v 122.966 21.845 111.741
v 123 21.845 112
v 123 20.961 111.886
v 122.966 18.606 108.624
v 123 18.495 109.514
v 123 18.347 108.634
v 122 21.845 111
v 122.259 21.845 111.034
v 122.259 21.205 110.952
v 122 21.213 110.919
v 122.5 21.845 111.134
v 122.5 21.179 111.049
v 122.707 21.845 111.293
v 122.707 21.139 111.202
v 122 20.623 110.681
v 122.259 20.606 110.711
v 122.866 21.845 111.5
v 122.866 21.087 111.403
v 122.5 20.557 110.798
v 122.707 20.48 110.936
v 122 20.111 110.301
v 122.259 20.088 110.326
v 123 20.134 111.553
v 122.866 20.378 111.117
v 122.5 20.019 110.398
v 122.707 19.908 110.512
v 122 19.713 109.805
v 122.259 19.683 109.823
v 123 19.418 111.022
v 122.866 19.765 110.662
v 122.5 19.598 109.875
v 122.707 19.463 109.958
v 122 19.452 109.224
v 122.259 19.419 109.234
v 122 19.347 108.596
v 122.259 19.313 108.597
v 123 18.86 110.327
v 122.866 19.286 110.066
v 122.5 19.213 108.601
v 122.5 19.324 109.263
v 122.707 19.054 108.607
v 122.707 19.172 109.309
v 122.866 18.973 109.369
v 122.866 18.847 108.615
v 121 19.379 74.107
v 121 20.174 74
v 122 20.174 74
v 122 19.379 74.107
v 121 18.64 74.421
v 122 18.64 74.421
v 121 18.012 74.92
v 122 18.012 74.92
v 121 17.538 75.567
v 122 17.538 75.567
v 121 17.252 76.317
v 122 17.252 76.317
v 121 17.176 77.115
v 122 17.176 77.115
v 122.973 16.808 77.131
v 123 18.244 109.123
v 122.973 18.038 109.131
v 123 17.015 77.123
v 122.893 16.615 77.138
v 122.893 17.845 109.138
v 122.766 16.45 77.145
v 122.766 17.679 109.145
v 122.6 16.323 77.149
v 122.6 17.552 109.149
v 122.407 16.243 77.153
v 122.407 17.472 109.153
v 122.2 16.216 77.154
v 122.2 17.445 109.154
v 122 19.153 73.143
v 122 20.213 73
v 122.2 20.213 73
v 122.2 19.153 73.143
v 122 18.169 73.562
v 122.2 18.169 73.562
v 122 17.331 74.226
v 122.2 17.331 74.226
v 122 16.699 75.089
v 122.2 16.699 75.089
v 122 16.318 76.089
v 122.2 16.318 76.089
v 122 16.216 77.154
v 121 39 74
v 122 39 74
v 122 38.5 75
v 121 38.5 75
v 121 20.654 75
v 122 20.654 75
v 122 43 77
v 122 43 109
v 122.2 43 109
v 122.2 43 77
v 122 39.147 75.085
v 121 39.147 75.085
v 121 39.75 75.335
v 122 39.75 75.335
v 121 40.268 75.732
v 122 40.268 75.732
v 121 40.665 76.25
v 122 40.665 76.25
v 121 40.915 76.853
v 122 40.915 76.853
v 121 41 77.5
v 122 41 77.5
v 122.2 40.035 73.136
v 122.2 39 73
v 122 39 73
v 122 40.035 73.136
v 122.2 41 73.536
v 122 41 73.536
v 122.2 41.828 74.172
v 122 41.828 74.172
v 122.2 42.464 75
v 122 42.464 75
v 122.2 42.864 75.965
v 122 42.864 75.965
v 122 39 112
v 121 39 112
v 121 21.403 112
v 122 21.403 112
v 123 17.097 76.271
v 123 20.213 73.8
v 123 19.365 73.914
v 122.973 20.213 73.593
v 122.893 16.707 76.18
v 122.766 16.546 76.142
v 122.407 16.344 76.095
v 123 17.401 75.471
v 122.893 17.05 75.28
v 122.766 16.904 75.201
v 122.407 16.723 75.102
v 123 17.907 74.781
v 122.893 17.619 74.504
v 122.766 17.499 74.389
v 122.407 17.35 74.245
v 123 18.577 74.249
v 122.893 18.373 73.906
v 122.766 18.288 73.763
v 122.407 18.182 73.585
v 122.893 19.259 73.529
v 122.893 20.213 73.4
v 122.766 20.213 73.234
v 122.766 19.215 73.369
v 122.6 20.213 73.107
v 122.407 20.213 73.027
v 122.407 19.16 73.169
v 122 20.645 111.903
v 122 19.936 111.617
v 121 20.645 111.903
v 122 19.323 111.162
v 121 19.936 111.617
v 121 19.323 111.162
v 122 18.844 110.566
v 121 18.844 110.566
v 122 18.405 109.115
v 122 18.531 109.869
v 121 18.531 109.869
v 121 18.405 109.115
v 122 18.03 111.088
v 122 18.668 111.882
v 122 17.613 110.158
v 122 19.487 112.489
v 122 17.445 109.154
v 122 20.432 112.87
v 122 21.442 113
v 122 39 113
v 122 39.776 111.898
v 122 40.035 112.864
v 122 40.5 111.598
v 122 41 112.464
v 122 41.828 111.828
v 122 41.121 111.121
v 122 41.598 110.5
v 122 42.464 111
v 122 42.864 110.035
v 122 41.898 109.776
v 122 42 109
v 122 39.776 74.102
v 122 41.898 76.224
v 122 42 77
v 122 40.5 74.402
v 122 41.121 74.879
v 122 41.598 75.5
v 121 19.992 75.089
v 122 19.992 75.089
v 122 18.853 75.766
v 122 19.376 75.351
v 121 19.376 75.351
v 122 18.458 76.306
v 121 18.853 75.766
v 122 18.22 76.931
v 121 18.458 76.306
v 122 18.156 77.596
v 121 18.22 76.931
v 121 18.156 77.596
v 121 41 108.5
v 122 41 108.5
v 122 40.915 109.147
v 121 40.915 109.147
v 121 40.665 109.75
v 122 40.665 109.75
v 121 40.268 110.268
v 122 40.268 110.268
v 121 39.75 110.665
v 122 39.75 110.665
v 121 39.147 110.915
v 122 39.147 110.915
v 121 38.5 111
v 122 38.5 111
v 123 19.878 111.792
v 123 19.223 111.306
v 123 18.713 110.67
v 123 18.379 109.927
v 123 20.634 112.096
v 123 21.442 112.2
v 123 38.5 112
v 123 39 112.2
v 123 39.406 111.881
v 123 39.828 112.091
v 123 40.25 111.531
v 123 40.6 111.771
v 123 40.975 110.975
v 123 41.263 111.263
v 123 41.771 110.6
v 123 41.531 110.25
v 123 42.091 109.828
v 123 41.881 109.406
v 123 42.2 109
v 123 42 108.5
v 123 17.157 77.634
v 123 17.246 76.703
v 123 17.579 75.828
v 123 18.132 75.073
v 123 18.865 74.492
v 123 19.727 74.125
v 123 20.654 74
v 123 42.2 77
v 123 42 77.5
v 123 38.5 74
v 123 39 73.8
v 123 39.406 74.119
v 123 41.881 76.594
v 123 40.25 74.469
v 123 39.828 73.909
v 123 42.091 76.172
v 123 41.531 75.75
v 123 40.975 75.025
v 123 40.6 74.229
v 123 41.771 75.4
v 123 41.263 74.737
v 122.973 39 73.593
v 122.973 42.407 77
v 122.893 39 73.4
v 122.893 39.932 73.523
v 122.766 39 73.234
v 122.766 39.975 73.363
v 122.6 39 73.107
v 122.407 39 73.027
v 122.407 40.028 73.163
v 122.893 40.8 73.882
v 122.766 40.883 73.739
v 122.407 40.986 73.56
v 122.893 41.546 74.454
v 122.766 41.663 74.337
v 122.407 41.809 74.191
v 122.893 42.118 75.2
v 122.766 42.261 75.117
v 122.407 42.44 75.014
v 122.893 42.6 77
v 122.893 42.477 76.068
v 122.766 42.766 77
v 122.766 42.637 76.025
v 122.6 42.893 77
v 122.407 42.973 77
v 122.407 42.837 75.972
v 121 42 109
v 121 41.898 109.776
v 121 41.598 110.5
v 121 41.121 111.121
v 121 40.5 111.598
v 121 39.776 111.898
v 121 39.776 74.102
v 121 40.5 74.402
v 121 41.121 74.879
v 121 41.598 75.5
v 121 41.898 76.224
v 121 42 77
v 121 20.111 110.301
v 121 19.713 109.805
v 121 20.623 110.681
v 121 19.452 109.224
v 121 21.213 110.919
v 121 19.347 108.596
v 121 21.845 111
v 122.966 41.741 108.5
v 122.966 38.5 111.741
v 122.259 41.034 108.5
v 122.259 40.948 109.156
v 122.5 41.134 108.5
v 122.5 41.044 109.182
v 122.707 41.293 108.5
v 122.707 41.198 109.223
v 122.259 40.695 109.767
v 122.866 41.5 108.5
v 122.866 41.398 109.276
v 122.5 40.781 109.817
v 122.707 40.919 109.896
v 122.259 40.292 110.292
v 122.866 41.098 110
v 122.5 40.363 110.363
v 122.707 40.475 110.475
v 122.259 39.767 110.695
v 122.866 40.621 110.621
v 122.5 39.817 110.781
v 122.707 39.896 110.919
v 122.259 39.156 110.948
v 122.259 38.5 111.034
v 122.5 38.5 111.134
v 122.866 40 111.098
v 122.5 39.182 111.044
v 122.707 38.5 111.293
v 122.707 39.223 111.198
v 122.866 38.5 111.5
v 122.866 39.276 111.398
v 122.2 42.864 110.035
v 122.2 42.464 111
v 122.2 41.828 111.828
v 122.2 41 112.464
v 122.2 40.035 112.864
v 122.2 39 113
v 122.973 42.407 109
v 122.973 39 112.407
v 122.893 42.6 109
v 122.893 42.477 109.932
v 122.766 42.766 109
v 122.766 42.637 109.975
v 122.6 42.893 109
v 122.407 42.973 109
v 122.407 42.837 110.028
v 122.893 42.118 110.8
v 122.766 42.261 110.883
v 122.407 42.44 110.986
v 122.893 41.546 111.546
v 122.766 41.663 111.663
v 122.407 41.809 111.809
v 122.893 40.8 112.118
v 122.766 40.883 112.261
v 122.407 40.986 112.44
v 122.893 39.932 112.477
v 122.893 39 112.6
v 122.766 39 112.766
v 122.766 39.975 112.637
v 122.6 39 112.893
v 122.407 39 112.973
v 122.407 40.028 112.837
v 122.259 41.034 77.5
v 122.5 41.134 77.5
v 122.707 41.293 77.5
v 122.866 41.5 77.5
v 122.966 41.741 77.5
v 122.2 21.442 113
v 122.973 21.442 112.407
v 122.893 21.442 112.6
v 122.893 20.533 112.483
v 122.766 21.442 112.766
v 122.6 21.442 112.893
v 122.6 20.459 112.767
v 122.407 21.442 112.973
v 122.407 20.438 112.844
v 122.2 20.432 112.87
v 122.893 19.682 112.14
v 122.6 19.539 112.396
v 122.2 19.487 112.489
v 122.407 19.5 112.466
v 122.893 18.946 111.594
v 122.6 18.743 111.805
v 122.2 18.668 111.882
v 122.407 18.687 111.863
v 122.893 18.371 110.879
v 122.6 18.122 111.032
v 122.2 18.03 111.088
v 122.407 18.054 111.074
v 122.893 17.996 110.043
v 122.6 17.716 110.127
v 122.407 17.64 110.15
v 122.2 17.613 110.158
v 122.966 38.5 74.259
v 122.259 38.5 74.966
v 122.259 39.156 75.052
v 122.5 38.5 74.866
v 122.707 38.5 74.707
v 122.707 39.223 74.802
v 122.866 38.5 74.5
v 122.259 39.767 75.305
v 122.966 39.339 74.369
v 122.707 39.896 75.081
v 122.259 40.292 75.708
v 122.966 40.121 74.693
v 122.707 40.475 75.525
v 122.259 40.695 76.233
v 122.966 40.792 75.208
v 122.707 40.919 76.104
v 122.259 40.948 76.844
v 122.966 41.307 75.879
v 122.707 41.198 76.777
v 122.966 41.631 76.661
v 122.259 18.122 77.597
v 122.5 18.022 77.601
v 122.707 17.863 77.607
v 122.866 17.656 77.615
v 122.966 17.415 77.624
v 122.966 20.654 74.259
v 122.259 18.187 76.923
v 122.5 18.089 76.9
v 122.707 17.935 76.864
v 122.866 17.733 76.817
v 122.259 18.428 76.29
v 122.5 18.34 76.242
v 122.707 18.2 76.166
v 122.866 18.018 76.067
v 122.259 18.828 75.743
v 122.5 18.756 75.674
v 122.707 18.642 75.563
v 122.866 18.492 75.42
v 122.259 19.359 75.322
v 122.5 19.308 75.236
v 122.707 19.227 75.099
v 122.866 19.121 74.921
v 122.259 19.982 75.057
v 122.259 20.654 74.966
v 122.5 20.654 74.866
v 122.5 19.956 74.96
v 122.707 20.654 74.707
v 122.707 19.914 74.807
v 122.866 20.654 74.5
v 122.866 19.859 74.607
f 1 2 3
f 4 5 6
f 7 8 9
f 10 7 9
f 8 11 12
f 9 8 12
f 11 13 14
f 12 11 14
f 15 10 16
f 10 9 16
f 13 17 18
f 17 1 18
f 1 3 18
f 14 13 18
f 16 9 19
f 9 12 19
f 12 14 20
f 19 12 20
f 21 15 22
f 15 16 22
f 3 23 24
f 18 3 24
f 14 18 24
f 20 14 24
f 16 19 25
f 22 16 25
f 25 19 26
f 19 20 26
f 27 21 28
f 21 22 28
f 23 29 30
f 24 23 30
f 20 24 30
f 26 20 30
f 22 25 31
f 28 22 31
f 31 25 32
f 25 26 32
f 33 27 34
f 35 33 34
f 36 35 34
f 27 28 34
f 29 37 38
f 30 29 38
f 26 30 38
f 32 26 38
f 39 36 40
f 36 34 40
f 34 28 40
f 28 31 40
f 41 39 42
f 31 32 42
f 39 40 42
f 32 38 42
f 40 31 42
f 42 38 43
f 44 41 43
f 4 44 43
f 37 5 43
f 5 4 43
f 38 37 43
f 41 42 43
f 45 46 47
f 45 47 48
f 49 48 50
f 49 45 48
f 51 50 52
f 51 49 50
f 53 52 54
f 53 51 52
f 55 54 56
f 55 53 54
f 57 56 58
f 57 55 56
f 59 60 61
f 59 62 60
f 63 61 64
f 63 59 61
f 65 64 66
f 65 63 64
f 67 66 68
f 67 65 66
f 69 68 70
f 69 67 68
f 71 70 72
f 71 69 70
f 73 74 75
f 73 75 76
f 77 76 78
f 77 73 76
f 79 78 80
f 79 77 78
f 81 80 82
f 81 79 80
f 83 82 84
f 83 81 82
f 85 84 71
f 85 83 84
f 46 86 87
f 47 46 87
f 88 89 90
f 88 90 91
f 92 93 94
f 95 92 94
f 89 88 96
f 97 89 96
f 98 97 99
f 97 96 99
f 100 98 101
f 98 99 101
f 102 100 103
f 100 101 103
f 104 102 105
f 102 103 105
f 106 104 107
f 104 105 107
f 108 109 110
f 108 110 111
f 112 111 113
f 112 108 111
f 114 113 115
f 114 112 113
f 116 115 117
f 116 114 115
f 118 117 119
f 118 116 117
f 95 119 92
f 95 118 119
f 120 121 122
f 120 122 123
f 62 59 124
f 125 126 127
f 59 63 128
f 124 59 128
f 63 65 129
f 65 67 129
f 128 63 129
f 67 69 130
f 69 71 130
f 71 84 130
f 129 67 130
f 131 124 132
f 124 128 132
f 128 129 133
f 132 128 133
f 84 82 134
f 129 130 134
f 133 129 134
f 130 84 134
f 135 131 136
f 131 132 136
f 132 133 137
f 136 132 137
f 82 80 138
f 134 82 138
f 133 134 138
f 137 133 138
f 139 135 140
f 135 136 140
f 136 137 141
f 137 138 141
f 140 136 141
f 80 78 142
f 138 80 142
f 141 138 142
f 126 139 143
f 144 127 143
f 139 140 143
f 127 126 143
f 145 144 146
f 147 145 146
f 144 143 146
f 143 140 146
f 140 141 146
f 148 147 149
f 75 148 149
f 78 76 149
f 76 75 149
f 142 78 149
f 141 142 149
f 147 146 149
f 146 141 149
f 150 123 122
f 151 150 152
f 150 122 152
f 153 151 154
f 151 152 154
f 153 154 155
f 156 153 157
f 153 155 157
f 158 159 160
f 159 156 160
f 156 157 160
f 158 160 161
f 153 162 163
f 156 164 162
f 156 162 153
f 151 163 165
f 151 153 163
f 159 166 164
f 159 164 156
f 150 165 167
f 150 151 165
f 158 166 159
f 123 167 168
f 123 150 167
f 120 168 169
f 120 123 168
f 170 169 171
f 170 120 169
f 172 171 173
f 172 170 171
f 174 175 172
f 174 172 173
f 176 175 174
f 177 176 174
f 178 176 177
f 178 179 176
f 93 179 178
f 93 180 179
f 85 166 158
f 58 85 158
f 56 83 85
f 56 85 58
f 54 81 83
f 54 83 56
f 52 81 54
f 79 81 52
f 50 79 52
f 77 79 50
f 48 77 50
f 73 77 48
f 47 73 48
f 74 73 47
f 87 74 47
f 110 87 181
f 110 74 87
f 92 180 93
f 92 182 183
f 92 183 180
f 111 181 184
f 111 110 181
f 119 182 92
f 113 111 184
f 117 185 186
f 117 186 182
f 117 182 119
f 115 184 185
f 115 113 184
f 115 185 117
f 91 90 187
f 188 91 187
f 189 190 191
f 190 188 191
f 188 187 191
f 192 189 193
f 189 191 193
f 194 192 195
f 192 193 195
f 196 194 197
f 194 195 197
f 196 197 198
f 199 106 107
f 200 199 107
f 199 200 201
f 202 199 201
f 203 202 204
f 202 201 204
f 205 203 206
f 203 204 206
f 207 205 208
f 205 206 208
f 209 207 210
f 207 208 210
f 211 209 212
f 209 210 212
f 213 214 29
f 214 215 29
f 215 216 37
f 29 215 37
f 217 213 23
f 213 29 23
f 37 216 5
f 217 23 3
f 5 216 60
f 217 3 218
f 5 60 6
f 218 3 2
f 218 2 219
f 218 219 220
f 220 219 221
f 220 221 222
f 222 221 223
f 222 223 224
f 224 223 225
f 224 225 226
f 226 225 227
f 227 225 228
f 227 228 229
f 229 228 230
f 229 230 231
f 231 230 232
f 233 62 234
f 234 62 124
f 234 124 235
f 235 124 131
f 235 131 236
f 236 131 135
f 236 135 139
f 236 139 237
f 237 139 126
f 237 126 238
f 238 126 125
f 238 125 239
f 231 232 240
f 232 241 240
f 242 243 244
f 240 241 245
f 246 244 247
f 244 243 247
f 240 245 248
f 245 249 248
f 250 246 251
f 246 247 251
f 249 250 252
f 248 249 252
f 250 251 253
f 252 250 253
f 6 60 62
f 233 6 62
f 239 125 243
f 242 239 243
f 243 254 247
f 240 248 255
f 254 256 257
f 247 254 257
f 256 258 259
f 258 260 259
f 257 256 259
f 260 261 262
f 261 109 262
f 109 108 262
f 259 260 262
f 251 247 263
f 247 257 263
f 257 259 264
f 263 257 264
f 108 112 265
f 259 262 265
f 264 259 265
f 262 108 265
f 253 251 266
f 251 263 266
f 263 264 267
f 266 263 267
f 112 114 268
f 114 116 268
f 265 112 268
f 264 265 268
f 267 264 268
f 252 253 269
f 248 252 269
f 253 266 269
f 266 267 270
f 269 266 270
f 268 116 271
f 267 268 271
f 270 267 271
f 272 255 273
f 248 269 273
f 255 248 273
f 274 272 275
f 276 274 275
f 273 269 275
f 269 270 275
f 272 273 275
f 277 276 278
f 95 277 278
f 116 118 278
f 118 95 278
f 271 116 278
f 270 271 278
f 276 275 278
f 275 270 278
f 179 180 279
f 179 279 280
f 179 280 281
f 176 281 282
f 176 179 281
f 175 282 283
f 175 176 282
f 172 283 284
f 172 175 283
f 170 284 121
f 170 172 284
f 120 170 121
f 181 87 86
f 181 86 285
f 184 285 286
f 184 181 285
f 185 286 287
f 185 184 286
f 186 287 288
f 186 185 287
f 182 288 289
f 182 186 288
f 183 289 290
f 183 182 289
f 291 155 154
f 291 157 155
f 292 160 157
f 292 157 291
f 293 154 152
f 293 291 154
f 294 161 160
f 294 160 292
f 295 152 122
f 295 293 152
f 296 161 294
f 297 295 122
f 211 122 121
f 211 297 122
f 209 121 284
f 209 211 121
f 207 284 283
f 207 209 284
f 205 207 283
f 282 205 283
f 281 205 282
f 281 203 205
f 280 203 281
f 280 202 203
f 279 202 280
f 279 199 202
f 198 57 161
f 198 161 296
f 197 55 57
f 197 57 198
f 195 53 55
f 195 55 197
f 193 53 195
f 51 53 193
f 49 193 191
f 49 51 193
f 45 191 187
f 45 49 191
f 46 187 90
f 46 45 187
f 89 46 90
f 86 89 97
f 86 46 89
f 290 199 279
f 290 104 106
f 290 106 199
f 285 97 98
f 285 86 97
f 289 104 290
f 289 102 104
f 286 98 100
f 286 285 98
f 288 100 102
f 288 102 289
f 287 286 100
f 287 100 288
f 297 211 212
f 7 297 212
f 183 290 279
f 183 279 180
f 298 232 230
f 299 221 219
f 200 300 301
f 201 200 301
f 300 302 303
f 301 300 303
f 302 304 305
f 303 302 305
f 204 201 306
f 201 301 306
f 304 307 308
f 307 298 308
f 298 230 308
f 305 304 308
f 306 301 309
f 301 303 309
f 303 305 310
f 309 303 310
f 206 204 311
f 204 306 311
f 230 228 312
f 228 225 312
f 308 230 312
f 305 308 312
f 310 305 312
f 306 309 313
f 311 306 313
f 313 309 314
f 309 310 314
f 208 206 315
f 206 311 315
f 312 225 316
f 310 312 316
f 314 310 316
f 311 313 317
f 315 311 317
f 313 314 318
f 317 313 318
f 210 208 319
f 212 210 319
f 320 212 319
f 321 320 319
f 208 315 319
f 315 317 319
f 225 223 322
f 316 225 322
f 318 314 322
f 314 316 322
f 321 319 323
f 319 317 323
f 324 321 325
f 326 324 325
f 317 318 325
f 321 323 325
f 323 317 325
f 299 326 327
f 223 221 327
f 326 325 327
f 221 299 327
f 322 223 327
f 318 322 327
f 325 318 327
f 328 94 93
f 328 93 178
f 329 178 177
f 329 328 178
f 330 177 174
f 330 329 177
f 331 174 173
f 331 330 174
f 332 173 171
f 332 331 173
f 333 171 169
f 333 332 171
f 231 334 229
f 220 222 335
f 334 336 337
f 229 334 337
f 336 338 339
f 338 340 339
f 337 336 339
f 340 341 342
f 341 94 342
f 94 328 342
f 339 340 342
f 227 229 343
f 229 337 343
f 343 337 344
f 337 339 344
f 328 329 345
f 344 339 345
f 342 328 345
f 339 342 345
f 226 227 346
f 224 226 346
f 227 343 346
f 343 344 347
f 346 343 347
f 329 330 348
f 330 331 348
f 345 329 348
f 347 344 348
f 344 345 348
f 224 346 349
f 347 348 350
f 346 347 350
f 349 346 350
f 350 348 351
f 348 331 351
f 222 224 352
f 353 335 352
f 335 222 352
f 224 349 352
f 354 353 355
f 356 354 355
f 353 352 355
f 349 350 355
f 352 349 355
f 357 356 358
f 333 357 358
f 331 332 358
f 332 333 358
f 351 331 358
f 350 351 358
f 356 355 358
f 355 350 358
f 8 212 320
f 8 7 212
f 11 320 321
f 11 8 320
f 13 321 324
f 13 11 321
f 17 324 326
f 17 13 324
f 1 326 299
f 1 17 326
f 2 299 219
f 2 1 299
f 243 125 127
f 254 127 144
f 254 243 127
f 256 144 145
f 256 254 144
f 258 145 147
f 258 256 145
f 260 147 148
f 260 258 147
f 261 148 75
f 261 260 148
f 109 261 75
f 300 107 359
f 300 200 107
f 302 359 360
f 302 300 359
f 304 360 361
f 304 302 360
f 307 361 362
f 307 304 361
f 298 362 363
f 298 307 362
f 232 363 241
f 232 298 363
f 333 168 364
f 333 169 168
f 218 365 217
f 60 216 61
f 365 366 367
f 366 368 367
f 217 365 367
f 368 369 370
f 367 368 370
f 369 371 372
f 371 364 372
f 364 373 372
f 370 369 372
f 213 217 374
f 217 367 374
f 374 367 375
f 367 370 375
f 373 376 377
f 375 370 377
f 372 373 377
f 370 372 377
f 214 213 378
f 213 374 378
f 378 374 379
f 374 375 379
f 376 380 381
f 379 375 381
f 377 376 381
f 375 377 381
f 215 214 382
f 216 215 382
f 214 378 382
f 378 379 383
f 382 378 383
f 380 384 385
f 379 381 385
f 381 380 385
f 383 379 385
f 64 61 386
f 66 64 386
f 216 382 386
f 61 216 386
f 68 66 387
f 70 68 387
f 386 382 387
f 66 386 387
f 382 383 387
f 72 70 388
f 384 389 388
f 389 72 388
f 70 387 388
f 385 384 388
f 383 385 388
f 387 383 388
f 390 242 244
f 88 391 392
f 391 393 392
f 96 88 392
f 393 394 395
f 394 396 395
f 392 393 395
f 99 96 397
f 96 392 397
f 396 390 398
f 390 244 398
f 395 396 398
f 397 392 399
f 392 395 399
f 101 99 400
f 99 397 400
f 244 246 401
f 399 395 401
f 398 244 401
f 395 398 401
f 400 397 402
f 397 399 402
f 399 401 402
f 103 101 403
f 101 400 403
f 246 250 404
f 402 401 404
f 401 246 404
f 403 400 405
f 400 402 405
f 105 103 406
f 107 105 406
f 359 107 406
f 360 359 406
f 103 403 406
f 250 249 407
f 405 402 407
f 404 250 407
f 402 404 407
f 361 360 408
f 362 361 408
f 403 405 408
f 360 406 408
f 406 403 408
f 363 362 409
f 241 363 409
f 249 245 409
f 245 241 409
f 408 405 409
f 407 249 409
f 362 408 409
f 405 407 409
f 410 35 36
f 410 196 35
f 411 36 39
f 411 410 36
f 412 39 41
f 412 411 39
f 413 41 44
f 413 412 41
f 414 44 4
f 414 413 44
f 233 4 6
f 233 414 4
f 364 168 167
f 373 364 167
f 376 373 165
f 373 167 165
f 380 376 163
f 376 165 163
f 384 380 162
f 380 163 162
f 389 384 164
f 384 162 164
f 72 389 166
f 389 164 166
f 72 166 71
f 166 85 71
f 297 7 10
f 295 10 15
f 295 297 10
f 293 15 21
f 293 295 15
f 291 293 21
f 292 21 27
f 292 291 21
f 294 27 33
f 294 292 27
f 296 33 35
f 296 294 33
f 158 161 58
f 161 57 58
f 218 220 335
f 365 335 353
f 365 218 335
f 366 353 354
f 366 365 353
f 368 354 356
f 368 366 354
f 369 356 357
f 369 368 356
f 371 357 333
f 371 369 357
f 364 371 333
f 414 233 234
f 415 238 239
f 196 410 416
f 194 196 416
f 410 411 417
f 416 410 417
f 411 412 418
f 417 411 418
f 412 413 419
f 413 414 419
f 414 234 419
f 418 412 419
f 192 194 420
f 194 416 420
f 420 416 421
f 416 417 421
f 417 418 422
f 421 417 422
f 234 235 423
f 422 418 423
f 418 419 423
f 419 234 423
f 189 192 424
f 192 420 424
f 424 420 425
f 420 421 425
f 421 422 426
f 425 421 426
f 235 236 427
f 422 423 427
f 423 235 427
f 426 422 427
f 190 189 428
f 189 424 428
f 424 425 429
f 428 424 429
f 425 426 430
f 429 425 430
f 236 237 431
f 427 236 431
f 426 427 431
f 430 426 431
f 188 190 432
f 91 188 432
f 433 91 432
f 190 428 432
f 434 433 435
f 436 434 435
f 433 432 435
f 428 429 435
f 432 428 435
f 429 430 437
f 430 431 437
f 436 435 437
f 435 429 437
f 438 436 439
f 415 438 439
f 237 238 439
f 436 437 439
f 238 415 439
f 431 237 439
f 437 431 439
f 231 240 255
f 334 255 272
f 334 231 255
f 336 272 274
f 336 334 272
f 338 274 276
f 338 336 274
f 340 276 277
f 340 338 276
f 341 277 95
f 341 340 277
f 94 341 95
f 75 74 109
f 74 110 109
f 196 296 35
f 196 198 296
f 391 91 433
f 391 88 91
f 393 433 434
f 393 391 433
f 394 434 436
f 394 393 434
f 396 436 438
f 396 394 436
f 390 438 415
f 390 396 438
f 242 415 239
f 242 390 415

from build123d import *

# Parameters (mm, degrees)
BOX047_W          = 5
BOX047_H          = 24
BOX047_DEPTH      = 40
BOX047_ROLL_ANGLE = -2.2
BOX046_W          = 5
BOX046_H          = 23
BOX046_DEPTH      = 36
FILLET050_R       = 2.5
BOX045_W          = 5
BOX045_H          = 24
BOX045_DEPTH      = 40
BOX045_ROLL_ANGLE = -2.2
BOX044_W          = 2
BOX044_H          = 25
BOX044_DEPTH      = 38
FILLET049_R       = 3
BOX043_W          = 5
BOX043_H          = 24
BOX043_DEPTH      = 42
BOX043_ROLL_ANGLE = -2.2
BOX042_W          = 1
BOX042_H          = 27
BOX042_DEPTH      = 40
FILLET048_R       = 4
FILLET051_R       = 1
FILLET052_R       = 0.8


with BuildPart() as cube473:
    # Box047 → Box047 (new body)
    with BuildSketch(Plane.XY):
        with Locations((2.5, 12)):
            Rectangle(BOX047_W, BOX047_H)
    extrude(amount=BOX047_DEPTH)


with BuildPart() as cube473_1:
    # Box047 roll: moved
    add(cube473.part.rotate(Axis((0, 0, 0), (1, 0, 0)), BOX047_ROLL_ANGLE))


with BuildPart() as cube473_2:
    # Box047 placement: moved
    add(cube473_1.part.moved(Location((175, -24, -1))))


with BuildPart() as fillet050:
    # Box046 → Box046 (new body)
    with BuildSketch(Plane(origin=(175, 0, 0), x_dir=(1, 0, 0), z_dir=(0, 0, 1))):
        with Locations((2.5, 11.5)):
            Rectangle(BOX046_W, BOX046_H)
    extrude(amount=BOX046_DEPTH)

    # Cut034: cut Cube473
    add(cube473_2.part, mode=Mode.SUBTRACT)


with BuildPart() as fillet050_1:
    # Cut034 placement: moved
    add(fillet050.part.moved(Location((-57, 17, 74))))

    # Fillet050
    fillet050_edges = [fillet050_1.edges().sort_by_distance(p)[0] for p in [
        (120.5, 40, 110),
        (120.5, 18.4391, 110),
        (120.5, 40, 74),
        (120.5, 17.056119, 74),
    ]]
    fillet(fillet050_edges, radius=FILLET050_R)


with BuildPart() as fillet050_2:
    # Fillet050 placement: moved
    add(fillet050_1.part.moved(Location((0, 1, 1))))


with BuildPart() as cube471:
    # Box045 → Box045 (new body)
    with BuildSketch(Plane.XY):
        with Locations((2.5, 12)):
            Rectangle(BOX045_W, BOX045_H)
    extrude(amount=BOX045_DEPTH)


with BuildPart() as cube471_1:
    # Box045 roll: moved
    add(cube471.part.rotate(Axis((0, 0, 0), (1, 0, 0)), BOX045_ROLL_ANGLE))


with BuildPart() as cube471_2:
    # Box045 placement: moved
    add(cube471_1.part.moved(Location((175, -24, -1))))


with BuildPart() as fillet049:
    # Box044 → Box044 (new body)
    with BuildSketch(Plane(origin=(175, 0, 0), x_dir=(1, 0, 0), z_dir=(0, 0, 1))):
        with Locations((1, 12.5)):
            Rectangle(BOX044_W, BOX044_H)
    extrude(amount=BOX044_DEPTH)

    # Cut033: cut Cube471
    add(cube471_2.part, mode=Mode.SUBTRACT)


with BuildPart() as fillet049_1:
    # Cut033 placement: moved
    add(fillet049.part.moved(Location((-57, 17, 74))))

    # Fillet049
    fillet049_edges = [fillet049_1.edges().sort_by_distance(p)[0] for p in [
        (119, 42, 112),
        (119, 18.515932, 112),
        (119, 42, 74),
        (119, 17.056119, 74),
    ]]
    fillet(fillet049_edges, radius=FILLET049_R)


with BuildPart() as fillet049_2:
    # Fillet049 placement: moved
    add(fillet049_1.part.moved(Location((3, 0, 0))))


with BuildPart() as cube469:
    # Box043 → Box043 (new body)
    with BuildSketch(Plane.XY):
        with Locations((2.5, 12)):
            Rectangle(BOX043_W, BOX043_H)
    extrude(amount=BOX043_DEPTH)


with BuildPart() as cube469_1:
    # Box043 roll: moved
    add(cube469.part.rotate(Axis((0, 0, 0), (1, 0, 0)), BOX043_ROLL_ANGLE))


with BuildPart() as cube469_2:
    # Box043 placement: moved
    add(cube469_1.part.moved(Location((175, -24, -1))))


with BuildPart() as fillet052:
    # Box042 → Box042 (new body)
    with BuildSketch(Plane(origin=(175, 0, 0), x_dir=(1, 0, 0), z_dir=(0, 0, 1))):
        with Locations((0.5, 13.5)):
            Rectangle(BOX042_W, BOX042_H)
    extrude(amount=BOX042_DEPTH)

    # Cut032: cut Cube469
    add(cube469_2.part, mode=Mode.SUBTRACT)


with BuildPart() as fillet052_1:
    # Cut032 placement: moved
    add(fillet052.part.moved(Location((-57, 16, 73))))

    # Fillet048
    fillet048_edges = [fillet052_1.edges().sort_by_distance(p)[0] for p in [
        (118.5, 43, 113),
        (118.5, 17.592764, 113),
        (118.5, 43, 73),
        (118.5, 16.056119, 73),
    ]]
    fillet(fillet048_edges, radius=FILLET048_R)


with BuildPart() as fillet052_2:
    # Fillet048 placement: moved
    add(fillet052_1.part.moved(Location((4, 0, 0))))

    # Fusion005: union Fillet049
    add(fillet049_2.part)

    # Cut035: cut Fillet050
    add(fillet050_2.part, mode=Mode.SUBTRACT)

    # Fillet051
    fillet051_edges = [fillet052_2.edges().sort_by_distance(p)[0] for p in [
        (123, 41, 93),
        (123, 18.751296, 93.09597),
    ]]
    fillet(fillet051_edges, radius=FILLET051_R)

    # Fillet052
    fillet052_edges = [fillet052_2.edges().sort_by_distance(p)[0] for p in [
        (123, 16.830341, 93.153551),
        (123, 43, 93),
    ]]
    fillet(fillet052_edges, radius=FILLET052_R)


solid = fillet052_2.part
